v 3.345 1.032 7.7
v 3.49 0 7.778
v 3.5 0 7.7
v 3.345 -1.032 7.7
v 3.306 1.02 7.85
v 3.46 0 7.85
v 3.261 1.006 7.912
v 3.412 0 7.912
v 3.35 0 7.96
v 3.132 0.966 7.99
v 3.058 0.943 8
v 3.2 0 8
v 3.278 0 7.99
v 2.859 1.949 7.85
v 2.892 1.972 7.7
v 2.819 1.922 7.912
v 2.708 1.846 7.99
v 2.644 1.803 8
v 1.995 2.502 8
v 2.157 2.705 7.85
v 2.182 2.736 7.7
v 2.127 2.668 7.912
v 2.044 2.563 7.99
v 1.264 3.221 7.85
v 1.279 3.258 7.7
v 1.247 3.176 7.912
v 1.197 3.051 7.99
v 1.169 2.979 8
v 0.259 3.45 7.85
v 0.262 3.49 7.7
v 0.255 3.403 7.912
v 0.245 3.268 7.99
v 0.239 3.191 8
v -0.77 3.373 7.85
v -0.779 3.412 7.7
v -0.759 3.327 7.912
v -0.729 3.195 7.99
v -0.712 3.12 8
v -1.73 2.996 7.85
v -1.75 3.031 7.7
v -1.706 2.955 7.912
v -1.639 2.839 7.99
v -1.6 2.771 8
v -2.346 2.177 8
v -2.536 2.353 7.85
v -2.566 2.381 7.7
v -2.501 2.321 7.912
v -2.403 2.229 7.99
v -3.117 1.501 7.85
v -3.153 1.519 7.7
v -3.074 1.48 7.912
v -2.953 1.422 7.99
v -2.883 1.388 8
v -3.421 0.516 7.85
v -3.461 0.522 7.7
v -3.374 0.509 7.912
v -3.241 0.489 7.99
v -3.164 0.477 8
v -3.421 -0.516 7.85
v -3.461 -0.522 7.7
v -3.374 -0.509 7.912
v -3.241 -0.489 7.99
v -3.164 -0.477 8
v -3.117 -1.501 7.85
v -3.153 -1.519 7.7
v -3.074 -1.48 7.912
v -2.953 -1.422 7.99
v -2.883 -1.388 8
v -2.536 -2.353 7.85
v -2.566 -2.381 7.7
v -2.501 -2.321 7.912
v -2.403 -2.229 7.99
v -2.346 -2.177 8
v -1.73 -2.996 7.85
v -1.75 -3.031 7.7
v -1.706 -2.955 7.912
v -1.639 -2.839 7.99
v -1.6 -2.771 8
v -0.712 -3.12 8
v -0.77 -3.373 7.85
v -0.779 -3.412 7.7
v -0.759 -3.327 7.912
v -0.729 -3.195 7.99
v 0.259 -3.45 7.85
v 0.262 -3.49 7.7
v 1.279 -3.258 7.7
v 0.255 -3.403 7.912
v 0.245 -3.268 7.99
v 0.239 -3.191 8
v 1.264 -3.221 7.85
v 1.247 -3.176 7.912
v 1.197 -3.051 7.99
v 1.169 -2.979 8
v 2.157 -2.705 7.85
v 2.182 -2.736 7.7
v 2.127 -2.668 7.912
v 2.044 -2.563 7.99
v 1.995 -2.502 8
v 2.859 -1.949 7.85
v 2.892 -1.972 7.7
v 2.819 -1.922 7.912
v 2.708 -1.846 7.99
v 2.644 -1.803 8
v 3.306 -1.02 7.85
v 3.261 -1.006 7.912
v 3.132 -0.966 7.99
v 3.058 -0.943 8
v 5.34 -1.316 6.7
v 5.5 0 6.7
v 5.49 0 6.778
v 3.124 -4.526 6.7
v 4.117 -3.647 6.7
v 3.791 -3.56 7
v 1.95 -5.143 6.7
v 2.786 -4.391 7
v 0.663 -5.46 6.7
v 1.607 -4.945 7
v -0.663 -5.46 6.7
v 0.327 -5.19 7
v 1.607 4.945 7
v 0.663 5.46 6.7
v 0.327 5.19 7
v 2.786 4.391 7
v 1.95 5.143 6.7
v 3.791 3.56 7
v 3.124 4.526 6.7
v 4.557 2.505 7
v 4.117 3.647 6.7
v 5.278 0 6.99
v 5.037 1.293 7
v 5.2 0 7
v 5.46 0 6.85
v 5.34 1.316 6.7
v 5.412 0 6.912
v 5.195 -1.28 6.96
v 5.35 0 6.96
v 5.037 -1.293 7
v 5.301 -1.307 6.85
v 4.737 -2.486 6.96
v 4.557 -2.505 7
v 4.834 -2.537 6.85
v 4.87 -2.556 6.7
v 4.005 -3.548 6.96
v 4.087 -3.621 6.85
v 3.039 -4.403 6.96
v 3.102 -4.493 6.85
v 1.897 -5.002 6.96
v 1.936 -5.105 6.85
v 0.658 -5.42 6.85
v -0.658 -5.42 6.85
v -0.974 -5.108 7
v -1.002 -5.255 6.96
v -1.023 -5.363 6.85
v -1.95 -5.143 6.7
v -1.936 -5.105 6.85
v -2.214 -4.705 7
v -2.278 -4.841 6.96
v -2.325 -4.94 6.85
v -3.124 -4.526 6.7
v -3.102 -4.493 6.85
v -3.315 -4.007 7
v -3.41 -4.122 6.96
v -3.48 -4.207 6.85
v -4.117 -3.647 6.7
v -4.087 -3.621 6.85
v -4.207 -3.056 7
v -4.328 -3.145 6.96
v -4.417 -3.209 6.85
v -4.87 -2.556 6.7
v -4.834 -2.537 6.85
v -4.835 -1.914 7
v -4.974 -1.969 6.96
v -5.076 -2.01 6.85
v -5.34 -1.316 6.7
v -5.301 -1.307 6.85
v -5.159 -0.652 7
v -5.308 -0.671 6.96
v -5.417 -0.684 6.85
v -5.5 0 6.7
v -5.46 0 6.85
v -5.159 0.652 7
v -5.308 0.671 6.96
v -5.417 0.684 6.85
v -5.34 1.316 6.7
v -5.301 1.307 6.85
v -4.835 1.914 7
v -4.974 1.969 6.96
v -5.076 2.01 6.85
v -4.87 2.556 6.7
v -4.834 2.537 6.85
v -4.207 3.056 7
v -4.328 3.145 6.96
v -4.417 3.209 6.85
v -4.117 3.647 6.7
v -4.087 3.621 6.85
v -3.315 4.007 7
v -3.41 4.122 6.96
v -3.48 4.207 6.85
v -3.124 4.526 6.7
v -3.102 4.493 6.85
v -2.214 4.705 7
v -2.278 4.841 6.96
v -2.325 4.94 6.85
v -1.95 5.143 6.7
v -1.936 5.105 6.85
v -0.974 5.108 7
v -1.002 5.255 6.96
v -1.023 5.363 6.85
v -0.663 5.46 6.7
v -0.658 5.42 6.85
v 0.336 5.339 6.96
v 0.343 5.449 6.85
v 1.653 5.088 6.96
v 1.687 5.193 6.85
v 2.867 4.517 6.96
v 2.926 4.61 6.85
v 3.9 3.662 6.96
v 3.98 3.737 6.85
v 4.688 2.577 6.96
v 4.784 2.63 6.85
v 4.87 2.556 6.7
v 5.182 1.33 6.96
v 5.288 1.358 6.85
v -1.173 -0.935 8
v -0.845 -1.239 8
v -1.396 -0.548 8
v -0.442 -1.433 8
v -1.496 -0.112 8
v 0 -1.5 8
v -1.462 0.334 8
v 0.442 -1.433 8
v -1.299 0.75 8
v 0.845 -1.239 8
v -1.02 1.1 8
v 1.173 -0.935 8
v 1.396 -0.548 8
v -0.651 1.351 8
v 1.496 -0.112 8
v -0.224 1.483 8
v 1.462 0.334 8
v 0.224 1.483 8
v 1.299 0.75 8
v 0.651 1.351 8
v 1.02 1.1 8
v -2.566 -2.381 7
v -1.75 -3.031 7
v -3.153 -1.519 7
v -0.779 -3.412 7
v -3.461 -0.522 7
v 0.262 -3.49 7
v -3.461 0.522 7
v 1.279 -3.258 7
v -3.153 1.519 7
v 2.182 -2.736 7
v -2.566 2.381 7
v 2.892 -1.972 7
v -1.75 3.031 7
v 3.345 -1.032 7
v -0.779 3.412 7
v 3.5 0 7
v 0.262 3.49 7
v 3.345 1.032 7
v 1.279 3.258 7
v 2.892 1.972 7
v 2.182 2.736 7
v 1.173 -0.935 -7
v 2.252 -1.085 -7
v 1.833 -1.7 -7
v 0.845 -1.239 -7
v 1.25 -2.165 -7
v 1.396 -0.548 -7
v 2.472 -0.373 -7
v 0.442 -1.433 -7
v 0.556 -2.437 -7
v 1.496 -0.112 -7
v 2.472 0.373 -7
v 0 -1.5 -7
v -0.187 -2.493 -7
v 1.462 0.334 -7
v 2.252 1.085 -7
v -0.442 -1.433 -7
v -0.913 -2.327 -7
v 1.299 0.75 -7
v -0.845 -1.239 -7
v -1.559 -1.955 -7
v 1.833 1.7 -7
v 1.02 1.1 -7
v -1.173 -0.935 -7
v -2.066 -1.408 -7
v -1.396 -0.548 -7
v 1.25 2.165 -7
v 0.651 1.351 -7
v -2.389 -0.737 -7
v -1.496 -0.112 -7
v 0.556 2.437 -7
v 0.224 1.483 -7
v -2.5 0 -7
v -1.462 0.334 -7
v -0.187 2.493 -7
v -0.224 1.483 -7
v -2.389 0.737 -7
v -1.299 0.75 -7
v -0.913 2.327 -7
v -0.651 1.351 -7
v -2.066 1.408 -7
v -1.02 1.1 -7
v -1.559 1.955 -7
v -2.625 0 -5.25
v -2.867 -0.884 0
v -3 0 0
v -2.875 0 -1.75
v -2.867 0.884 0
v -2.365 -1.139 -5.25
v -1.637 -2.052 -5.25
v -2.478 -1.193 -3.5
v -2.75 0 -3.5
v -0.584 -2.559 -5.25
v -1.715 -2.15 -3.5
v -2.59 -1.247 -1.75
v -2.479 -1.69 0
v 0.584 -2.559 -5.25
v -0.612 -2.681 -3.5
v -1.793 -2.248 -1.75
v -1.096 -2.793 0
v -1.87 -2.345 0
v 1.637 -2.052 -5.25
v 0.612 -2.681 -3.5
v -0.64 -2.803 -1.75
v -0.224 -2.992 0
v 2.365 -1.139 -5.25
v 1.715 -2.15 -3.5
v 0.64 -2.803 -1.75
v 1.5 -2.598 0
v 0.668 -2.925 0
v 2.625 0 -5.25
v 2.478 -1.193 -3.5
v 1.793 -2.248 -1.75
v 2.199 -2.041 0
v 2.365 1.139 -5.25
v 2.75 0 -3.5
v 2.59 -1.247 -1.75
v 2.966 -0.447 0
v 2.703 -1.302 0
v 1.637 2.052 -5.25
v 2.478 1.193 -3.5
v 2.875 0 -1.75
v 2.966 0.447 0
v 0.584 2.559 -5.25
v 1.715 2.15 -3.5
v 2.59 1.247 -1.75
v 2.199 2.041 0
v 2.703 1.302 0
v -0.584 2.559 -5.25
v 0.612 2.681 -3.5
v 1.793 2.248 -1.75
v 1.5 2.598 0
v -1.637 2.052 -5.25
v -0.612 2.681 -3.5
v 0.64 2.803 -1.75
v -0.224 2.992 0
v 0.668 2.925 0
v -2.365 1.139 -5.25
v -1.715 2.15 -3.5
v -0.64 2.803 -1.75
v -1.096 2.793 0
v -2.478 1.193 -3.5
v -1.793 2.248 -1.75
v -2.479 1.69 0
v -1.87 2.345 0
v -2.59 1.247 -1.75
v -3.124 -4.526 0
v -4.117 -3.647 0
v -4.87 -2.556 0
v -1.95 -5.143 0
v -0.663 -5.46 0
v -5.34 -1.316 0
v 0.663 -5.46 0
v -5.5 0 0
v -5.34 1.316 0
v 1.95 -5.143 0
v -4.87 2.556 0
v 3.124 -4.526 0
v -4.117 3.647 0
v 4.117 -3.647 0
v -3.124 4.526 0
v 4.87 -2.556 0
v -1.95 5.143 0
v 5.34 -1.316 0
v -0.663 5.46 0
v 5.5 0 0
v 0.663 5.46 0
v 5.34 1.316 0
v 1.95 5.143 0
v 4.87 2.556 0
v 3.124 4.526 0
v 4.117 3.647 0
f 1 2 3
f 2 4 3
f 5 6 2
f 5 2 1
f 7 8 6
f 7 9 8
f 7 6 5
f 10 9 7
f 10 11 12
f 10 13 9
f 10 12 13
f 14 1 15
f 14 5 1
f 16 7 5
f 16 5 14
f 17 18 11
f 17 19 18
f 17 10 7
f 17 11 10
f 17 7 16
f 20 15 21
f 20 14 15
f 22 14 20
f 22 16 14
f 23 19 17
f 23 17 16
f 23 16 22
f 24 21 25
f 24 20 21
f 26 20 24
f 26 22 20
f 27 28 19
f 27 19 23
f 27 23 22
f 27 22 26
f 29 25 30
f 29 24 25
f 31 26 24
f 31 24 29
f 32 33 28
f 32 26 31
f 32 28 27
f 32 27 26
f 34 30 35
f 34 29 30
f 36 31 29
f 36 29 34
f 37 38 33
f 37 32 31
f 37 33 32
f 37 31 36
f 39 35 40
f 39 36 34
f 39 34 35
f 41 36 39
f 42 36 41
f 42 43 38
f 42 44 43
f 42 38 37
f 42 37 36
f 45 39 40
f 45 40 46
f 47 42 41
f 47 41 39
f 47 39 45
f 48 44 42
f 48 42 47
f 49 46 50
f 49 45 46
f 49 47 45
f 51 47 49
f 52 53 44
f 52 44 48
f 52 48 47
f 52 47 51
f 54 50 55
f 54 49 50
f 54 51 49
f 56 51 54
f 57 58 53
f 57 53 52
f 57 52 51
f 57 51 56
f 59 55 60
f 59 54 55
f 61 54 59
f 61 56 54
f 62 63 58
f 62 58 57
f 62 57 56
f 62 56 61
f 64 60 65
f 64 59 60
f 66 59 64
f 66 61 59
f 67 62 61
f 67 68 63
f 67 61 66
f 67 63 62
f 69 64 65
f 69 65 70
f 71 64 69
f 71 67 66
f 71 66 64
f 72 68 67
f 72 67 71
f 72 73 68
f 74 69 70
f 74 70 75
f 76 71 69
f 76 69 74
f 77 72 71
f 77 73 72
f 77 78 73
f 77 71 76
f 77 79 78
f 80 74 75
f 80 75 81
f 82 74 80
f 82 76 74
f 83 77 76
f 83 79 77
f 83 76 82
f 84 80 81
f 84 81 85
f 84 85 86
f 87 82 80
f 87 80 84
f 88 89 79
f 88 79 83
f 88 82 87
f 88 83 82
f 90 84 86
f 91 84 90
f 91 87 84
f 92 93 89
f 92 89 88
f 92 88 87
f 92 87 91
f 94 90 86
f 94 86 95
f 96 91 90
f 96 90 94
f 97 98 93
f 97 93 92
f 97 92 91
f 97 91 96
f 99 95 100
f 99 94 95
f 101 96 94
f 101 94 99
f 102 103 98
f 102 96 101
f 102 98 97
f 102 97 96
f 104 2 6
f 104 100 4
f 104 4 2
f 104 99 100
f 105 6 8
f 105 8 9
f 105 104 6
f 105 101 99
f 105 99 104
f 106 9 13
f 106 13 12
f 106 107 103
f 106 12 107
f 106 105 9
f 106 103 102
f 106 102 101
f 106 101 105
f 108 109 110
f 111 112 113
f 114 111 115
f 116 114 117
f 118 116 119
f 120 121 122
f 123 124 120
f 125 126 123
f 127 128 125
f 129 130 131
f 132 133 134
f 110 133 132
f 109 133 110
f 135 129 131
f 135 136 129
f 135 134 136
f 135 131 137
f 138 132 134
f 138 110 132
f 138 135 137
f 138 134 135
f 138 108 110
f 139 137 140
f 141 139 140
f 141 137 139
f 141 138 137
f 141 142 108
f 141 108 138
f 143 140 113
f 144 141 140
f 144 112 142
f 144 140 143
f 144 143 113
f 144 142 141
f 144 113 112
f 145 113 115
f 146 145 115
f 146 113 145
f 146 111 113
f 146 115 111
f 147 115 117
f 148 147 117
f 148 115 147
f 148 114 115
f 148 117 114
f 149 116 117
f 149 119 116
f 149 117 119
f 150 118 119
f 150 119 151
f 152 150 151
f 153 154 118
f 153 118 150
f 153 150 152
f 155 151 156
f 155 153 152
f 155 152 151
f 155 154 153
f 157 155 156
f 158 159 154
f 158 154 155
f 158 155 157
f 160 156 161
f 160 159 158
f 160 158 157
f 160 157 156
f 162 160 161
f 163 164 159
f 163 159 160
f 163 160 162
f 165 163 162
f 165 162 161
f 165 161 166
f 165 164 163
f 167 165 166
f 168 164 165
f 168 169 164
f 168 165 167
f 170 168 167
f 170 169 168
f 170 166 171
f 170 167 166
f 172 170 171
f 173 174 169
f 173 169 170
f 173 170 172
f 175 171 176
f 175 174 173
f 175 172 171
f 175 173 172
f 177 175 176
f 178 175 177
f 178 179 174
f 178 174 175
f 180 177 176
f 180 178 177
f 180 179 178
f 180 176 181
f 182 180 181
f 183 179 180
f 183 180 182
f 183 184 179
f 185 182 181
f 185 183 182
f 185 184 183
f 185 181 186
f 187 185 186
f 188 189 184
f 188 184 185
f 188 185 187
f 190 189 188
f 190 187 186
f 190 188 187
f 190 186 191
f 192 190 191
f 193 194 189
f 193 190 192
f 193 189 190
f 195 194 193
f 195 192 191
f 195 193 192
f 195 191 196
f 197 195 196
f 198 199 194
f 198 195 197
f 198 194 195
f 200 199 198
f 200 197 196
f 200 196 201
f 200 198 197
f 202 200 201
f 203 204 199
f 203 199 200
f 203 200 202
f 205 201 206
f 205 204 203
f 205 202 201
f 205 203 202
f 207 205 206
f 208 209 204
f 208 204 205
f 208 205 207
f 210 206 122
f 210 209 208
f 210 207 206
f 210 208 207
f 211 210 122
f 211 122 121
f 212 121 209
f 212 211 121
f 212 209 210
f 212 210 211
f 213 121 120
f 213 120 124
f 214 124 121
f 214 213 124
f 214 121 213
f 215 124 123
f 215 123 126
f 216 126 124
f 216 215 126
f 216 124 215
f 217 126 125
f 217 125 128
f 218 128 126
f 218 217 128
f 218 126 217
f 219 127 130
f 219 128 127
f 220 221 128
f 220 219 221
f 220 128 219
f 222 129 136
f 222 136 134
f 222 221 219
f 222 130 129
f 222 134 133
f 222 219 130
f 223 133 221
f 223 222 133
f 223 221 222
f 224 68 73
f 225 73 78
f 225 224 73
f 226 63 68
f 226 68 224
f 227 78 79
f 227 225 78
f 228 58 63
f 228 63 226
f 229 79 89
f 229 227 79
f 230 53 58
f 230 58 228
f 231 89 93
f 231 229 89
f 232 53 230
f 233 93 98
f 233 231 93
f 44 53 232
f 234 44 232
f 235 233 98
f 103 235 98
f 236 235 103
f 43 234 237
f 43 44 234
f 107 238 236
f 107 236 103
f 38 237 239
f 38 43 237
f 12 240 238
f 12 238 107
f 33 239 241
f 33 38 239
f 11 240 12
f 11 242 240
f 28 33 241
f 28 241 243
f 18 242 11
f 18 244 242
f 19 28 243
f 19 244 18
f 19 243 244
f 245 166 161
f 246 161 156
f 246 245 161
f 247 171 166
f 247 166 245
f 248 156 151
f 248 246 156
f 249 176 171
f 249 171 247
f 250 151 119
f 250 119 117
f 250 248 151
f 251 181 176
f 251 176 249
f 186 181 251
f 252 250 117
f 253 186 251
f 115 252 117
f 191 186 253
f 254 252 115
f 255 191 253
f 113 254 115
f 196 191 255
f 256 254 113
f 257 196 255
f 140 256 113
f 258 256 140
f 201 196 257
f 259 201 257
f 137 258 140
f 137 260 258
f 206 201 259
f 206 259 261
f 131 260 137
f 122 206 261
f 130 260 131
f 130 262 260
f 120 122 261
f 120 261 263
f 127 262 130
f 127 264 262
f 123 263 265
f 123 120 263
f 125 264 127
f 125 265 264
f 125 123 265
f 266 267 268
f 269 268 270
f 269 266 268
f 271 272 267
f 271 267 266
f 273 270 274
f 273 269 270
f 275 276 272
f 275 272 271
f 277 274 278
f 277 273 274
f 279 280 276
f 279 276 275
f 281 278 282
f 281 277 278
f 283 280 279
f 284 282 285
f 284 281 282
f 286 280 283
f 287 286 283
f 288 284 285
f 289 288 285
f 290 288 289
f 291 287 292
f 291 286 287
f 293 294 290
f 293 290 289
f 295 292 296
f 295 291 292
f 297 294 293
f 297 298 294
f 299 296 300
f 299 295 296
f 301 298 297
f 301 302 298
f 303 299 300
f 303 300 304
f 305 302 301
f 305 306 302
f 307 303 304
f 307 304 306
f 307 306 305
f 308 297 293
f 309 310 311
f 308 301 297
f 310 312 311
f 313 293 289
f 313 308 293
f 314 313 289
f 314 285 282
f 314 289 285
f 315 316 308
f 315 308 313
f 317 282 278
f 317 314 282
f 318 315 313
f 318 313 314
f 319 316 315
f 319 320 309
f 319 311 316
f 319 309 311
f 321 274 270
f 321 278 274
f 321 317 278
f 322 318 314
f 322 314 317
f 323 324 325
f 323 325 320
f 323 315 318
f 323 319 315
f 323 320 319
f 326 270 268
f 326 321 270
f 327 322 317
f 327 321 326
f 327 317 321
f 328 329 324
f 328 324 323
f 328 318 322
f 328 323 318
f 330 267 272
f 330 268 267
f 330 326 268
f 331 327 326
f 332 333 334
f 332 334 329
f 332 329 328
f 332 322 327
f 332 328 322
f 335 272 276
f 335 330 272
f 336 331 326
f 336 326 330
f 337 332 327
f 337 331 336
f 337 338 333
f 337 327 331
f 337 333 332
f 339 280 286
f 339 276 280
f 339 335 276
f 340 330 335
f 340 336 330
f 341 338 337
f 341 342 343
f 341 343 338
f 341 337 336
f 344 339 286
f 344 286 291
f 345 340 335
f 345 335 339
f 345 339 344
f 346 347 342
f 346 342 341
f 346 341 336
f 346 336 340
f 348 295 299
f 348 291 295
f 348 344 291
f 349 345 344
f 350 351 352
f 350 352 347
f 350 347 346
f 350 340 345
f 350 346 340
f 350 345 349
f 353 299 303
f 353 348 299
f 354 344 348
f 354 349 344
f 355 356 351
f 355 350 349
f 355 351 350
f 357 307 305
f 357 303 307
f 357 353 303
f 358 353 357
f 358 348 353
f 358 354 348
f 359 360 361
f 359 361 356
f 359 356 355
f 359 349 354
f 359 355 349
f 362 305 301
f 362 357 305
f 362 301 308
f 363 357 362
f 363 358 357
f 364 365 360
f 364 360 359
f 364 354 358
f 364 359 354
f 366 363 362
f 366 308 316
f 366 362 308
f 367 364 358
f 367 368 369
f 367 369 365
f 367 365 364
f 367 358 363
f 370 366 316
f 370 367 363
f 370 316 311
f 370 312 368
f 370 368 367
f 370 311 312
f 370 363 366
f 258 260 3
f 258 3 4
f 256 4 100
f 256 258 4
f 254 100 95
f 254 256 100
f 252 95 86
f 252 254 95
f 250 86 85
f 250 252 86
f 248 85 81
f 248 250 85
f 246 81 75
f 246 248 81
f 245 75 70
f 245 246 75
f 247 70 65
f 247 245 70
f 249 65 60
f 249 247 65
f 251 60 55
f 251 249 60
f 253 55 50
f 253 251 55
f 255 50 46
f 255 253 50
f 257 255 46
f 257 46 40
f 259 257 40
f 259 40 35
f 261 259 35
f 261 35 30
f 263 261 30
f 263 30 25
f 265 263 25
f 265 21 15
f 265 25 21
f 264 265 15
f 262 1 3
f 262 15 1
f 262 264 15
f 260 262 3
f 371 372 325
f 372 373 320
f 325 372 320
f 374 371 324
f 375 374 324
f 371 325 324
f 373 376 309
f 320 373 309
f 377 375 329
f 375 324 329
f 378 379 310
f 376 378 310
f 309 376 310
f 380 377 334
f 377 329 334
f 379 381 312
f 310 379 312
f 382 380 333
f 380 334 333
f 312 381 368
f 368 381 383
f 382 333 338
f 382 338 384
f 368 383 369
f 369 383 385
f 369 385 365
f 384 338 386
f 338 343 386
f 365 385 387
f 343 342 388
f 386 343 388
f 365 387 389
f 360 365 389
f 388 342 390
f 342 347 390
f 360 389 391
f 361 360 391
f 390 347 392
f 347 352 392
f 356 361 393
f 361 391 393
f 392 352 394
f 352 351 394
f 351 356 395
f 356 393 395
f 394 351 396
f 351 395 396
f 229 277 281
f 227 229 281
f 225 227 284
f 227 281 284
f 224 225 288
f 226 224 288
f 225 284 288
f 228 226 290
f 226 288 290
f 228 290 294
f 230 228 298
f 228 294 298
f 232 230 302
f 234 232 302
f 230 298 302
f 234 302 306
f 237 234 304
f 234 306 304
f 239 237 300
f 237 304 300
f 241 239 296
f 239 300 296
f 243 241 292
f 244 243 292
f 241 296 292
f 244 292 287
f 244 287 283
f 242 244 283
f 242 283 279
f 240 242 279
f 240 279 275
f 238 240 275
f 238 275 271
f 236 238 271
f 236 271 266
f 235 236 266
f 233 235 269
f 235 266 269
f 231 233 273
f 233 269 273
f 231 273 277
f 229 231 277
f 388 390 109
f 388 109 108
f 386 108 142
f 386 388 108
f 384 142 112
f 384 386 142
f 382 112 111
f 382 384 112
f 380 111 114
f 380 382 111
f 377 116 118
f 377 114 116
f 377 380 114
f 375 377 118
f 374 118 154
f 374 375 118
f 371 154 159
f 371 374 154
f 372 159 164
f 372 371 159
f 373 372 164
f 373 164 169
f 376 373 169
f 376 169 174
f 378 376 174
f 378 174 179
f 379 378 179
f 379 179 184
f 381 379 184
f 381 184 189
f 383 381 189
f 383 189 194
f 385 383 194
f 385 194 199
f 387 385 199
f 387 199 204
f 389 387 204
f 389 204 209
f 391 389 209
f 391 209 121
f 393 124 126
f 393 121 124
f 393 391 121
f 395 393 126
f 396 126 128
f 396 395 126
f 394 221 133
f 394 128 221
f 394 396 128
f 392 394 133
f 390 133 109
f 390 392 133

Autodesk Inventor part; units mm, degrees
ref_plane "YZ Plane" through (0, 0, 0) normal (1, 0, 0) x (0, 1, 0)
ref_plane "XZ Plane" through (0, 0, 0) normal (0, 1, 0) x (-1, 0, 0)
sketch "Sketch1" plane through (0, 0, 0) normal (0, 0, 1) x (1, 0, 0)
  circle A0 centre (0, 0) radius 5.5
  dimension "d0" = 11
extrude "Extrusion1" add sketch "Sketch1" along normal blind 7
sketch "Sketch2" plane through (0, 0, 7) normal (0, 0, 1) x (1, 0, 0)
  circle A0 centre (0, 0) radius 3.5
  dimension "d3" = 7
extrude "Extrusion2" add sketch "Sketch2" along normal blind 1
sketch "Sketch4" plane through (0, 0, 8) normal (0, 0, 1) x (1, 0, 0)
  circle A0 centre (0, 0) radius 1.5
  dimension "d7" = 3
hole "Hole1" at (0, 0, 8) direction (0, 0, -1) diameter 3 end through all
fillet "Fillet1" radius 0.3 1 edges at (-3.5, 0, 8)
fillet "Fillet2" radius 0.3 1 edges at (-5.5, 0, 7)
sketch "Sketch5" plane through (0, 0, 0) normal (0, 0, -1) x (-1, 0, 0)
  circle A0 centre (0, 0) radius 1.5
  circle A1 centre (0, 0) radius 3
  dimension "d17" = 6
ref_plane "Work Plane1" through (0, 0, -7) normal (0, 0, -1) x (-1, 0, 0)
sketch "Sketch6" plane through (0, 0, -7) normal (0, 0, -1) x (-1, 0, 0)
  circle A0 centre (0, 0) radius 2.5
  dimension "d19" = 5
loft "Loft1" add profiles "Sketch6", "Sketch5" contours all / A0 | A1
sketch "Sketch7" plane through (0, 0, 0) normal (0, 0, 1) x (1, 0, 0)
  point P0 (0, 0)
  point P1 (0, 0)
hole "Hole2" at (0, 0, 0) at (0, 0, 0) direction (0, 0, -1) diameter 3 end through all
thread "Thread1" size "R 1/8" standard "ISO Taper" length 9
properties part number "Banana Hembra"
